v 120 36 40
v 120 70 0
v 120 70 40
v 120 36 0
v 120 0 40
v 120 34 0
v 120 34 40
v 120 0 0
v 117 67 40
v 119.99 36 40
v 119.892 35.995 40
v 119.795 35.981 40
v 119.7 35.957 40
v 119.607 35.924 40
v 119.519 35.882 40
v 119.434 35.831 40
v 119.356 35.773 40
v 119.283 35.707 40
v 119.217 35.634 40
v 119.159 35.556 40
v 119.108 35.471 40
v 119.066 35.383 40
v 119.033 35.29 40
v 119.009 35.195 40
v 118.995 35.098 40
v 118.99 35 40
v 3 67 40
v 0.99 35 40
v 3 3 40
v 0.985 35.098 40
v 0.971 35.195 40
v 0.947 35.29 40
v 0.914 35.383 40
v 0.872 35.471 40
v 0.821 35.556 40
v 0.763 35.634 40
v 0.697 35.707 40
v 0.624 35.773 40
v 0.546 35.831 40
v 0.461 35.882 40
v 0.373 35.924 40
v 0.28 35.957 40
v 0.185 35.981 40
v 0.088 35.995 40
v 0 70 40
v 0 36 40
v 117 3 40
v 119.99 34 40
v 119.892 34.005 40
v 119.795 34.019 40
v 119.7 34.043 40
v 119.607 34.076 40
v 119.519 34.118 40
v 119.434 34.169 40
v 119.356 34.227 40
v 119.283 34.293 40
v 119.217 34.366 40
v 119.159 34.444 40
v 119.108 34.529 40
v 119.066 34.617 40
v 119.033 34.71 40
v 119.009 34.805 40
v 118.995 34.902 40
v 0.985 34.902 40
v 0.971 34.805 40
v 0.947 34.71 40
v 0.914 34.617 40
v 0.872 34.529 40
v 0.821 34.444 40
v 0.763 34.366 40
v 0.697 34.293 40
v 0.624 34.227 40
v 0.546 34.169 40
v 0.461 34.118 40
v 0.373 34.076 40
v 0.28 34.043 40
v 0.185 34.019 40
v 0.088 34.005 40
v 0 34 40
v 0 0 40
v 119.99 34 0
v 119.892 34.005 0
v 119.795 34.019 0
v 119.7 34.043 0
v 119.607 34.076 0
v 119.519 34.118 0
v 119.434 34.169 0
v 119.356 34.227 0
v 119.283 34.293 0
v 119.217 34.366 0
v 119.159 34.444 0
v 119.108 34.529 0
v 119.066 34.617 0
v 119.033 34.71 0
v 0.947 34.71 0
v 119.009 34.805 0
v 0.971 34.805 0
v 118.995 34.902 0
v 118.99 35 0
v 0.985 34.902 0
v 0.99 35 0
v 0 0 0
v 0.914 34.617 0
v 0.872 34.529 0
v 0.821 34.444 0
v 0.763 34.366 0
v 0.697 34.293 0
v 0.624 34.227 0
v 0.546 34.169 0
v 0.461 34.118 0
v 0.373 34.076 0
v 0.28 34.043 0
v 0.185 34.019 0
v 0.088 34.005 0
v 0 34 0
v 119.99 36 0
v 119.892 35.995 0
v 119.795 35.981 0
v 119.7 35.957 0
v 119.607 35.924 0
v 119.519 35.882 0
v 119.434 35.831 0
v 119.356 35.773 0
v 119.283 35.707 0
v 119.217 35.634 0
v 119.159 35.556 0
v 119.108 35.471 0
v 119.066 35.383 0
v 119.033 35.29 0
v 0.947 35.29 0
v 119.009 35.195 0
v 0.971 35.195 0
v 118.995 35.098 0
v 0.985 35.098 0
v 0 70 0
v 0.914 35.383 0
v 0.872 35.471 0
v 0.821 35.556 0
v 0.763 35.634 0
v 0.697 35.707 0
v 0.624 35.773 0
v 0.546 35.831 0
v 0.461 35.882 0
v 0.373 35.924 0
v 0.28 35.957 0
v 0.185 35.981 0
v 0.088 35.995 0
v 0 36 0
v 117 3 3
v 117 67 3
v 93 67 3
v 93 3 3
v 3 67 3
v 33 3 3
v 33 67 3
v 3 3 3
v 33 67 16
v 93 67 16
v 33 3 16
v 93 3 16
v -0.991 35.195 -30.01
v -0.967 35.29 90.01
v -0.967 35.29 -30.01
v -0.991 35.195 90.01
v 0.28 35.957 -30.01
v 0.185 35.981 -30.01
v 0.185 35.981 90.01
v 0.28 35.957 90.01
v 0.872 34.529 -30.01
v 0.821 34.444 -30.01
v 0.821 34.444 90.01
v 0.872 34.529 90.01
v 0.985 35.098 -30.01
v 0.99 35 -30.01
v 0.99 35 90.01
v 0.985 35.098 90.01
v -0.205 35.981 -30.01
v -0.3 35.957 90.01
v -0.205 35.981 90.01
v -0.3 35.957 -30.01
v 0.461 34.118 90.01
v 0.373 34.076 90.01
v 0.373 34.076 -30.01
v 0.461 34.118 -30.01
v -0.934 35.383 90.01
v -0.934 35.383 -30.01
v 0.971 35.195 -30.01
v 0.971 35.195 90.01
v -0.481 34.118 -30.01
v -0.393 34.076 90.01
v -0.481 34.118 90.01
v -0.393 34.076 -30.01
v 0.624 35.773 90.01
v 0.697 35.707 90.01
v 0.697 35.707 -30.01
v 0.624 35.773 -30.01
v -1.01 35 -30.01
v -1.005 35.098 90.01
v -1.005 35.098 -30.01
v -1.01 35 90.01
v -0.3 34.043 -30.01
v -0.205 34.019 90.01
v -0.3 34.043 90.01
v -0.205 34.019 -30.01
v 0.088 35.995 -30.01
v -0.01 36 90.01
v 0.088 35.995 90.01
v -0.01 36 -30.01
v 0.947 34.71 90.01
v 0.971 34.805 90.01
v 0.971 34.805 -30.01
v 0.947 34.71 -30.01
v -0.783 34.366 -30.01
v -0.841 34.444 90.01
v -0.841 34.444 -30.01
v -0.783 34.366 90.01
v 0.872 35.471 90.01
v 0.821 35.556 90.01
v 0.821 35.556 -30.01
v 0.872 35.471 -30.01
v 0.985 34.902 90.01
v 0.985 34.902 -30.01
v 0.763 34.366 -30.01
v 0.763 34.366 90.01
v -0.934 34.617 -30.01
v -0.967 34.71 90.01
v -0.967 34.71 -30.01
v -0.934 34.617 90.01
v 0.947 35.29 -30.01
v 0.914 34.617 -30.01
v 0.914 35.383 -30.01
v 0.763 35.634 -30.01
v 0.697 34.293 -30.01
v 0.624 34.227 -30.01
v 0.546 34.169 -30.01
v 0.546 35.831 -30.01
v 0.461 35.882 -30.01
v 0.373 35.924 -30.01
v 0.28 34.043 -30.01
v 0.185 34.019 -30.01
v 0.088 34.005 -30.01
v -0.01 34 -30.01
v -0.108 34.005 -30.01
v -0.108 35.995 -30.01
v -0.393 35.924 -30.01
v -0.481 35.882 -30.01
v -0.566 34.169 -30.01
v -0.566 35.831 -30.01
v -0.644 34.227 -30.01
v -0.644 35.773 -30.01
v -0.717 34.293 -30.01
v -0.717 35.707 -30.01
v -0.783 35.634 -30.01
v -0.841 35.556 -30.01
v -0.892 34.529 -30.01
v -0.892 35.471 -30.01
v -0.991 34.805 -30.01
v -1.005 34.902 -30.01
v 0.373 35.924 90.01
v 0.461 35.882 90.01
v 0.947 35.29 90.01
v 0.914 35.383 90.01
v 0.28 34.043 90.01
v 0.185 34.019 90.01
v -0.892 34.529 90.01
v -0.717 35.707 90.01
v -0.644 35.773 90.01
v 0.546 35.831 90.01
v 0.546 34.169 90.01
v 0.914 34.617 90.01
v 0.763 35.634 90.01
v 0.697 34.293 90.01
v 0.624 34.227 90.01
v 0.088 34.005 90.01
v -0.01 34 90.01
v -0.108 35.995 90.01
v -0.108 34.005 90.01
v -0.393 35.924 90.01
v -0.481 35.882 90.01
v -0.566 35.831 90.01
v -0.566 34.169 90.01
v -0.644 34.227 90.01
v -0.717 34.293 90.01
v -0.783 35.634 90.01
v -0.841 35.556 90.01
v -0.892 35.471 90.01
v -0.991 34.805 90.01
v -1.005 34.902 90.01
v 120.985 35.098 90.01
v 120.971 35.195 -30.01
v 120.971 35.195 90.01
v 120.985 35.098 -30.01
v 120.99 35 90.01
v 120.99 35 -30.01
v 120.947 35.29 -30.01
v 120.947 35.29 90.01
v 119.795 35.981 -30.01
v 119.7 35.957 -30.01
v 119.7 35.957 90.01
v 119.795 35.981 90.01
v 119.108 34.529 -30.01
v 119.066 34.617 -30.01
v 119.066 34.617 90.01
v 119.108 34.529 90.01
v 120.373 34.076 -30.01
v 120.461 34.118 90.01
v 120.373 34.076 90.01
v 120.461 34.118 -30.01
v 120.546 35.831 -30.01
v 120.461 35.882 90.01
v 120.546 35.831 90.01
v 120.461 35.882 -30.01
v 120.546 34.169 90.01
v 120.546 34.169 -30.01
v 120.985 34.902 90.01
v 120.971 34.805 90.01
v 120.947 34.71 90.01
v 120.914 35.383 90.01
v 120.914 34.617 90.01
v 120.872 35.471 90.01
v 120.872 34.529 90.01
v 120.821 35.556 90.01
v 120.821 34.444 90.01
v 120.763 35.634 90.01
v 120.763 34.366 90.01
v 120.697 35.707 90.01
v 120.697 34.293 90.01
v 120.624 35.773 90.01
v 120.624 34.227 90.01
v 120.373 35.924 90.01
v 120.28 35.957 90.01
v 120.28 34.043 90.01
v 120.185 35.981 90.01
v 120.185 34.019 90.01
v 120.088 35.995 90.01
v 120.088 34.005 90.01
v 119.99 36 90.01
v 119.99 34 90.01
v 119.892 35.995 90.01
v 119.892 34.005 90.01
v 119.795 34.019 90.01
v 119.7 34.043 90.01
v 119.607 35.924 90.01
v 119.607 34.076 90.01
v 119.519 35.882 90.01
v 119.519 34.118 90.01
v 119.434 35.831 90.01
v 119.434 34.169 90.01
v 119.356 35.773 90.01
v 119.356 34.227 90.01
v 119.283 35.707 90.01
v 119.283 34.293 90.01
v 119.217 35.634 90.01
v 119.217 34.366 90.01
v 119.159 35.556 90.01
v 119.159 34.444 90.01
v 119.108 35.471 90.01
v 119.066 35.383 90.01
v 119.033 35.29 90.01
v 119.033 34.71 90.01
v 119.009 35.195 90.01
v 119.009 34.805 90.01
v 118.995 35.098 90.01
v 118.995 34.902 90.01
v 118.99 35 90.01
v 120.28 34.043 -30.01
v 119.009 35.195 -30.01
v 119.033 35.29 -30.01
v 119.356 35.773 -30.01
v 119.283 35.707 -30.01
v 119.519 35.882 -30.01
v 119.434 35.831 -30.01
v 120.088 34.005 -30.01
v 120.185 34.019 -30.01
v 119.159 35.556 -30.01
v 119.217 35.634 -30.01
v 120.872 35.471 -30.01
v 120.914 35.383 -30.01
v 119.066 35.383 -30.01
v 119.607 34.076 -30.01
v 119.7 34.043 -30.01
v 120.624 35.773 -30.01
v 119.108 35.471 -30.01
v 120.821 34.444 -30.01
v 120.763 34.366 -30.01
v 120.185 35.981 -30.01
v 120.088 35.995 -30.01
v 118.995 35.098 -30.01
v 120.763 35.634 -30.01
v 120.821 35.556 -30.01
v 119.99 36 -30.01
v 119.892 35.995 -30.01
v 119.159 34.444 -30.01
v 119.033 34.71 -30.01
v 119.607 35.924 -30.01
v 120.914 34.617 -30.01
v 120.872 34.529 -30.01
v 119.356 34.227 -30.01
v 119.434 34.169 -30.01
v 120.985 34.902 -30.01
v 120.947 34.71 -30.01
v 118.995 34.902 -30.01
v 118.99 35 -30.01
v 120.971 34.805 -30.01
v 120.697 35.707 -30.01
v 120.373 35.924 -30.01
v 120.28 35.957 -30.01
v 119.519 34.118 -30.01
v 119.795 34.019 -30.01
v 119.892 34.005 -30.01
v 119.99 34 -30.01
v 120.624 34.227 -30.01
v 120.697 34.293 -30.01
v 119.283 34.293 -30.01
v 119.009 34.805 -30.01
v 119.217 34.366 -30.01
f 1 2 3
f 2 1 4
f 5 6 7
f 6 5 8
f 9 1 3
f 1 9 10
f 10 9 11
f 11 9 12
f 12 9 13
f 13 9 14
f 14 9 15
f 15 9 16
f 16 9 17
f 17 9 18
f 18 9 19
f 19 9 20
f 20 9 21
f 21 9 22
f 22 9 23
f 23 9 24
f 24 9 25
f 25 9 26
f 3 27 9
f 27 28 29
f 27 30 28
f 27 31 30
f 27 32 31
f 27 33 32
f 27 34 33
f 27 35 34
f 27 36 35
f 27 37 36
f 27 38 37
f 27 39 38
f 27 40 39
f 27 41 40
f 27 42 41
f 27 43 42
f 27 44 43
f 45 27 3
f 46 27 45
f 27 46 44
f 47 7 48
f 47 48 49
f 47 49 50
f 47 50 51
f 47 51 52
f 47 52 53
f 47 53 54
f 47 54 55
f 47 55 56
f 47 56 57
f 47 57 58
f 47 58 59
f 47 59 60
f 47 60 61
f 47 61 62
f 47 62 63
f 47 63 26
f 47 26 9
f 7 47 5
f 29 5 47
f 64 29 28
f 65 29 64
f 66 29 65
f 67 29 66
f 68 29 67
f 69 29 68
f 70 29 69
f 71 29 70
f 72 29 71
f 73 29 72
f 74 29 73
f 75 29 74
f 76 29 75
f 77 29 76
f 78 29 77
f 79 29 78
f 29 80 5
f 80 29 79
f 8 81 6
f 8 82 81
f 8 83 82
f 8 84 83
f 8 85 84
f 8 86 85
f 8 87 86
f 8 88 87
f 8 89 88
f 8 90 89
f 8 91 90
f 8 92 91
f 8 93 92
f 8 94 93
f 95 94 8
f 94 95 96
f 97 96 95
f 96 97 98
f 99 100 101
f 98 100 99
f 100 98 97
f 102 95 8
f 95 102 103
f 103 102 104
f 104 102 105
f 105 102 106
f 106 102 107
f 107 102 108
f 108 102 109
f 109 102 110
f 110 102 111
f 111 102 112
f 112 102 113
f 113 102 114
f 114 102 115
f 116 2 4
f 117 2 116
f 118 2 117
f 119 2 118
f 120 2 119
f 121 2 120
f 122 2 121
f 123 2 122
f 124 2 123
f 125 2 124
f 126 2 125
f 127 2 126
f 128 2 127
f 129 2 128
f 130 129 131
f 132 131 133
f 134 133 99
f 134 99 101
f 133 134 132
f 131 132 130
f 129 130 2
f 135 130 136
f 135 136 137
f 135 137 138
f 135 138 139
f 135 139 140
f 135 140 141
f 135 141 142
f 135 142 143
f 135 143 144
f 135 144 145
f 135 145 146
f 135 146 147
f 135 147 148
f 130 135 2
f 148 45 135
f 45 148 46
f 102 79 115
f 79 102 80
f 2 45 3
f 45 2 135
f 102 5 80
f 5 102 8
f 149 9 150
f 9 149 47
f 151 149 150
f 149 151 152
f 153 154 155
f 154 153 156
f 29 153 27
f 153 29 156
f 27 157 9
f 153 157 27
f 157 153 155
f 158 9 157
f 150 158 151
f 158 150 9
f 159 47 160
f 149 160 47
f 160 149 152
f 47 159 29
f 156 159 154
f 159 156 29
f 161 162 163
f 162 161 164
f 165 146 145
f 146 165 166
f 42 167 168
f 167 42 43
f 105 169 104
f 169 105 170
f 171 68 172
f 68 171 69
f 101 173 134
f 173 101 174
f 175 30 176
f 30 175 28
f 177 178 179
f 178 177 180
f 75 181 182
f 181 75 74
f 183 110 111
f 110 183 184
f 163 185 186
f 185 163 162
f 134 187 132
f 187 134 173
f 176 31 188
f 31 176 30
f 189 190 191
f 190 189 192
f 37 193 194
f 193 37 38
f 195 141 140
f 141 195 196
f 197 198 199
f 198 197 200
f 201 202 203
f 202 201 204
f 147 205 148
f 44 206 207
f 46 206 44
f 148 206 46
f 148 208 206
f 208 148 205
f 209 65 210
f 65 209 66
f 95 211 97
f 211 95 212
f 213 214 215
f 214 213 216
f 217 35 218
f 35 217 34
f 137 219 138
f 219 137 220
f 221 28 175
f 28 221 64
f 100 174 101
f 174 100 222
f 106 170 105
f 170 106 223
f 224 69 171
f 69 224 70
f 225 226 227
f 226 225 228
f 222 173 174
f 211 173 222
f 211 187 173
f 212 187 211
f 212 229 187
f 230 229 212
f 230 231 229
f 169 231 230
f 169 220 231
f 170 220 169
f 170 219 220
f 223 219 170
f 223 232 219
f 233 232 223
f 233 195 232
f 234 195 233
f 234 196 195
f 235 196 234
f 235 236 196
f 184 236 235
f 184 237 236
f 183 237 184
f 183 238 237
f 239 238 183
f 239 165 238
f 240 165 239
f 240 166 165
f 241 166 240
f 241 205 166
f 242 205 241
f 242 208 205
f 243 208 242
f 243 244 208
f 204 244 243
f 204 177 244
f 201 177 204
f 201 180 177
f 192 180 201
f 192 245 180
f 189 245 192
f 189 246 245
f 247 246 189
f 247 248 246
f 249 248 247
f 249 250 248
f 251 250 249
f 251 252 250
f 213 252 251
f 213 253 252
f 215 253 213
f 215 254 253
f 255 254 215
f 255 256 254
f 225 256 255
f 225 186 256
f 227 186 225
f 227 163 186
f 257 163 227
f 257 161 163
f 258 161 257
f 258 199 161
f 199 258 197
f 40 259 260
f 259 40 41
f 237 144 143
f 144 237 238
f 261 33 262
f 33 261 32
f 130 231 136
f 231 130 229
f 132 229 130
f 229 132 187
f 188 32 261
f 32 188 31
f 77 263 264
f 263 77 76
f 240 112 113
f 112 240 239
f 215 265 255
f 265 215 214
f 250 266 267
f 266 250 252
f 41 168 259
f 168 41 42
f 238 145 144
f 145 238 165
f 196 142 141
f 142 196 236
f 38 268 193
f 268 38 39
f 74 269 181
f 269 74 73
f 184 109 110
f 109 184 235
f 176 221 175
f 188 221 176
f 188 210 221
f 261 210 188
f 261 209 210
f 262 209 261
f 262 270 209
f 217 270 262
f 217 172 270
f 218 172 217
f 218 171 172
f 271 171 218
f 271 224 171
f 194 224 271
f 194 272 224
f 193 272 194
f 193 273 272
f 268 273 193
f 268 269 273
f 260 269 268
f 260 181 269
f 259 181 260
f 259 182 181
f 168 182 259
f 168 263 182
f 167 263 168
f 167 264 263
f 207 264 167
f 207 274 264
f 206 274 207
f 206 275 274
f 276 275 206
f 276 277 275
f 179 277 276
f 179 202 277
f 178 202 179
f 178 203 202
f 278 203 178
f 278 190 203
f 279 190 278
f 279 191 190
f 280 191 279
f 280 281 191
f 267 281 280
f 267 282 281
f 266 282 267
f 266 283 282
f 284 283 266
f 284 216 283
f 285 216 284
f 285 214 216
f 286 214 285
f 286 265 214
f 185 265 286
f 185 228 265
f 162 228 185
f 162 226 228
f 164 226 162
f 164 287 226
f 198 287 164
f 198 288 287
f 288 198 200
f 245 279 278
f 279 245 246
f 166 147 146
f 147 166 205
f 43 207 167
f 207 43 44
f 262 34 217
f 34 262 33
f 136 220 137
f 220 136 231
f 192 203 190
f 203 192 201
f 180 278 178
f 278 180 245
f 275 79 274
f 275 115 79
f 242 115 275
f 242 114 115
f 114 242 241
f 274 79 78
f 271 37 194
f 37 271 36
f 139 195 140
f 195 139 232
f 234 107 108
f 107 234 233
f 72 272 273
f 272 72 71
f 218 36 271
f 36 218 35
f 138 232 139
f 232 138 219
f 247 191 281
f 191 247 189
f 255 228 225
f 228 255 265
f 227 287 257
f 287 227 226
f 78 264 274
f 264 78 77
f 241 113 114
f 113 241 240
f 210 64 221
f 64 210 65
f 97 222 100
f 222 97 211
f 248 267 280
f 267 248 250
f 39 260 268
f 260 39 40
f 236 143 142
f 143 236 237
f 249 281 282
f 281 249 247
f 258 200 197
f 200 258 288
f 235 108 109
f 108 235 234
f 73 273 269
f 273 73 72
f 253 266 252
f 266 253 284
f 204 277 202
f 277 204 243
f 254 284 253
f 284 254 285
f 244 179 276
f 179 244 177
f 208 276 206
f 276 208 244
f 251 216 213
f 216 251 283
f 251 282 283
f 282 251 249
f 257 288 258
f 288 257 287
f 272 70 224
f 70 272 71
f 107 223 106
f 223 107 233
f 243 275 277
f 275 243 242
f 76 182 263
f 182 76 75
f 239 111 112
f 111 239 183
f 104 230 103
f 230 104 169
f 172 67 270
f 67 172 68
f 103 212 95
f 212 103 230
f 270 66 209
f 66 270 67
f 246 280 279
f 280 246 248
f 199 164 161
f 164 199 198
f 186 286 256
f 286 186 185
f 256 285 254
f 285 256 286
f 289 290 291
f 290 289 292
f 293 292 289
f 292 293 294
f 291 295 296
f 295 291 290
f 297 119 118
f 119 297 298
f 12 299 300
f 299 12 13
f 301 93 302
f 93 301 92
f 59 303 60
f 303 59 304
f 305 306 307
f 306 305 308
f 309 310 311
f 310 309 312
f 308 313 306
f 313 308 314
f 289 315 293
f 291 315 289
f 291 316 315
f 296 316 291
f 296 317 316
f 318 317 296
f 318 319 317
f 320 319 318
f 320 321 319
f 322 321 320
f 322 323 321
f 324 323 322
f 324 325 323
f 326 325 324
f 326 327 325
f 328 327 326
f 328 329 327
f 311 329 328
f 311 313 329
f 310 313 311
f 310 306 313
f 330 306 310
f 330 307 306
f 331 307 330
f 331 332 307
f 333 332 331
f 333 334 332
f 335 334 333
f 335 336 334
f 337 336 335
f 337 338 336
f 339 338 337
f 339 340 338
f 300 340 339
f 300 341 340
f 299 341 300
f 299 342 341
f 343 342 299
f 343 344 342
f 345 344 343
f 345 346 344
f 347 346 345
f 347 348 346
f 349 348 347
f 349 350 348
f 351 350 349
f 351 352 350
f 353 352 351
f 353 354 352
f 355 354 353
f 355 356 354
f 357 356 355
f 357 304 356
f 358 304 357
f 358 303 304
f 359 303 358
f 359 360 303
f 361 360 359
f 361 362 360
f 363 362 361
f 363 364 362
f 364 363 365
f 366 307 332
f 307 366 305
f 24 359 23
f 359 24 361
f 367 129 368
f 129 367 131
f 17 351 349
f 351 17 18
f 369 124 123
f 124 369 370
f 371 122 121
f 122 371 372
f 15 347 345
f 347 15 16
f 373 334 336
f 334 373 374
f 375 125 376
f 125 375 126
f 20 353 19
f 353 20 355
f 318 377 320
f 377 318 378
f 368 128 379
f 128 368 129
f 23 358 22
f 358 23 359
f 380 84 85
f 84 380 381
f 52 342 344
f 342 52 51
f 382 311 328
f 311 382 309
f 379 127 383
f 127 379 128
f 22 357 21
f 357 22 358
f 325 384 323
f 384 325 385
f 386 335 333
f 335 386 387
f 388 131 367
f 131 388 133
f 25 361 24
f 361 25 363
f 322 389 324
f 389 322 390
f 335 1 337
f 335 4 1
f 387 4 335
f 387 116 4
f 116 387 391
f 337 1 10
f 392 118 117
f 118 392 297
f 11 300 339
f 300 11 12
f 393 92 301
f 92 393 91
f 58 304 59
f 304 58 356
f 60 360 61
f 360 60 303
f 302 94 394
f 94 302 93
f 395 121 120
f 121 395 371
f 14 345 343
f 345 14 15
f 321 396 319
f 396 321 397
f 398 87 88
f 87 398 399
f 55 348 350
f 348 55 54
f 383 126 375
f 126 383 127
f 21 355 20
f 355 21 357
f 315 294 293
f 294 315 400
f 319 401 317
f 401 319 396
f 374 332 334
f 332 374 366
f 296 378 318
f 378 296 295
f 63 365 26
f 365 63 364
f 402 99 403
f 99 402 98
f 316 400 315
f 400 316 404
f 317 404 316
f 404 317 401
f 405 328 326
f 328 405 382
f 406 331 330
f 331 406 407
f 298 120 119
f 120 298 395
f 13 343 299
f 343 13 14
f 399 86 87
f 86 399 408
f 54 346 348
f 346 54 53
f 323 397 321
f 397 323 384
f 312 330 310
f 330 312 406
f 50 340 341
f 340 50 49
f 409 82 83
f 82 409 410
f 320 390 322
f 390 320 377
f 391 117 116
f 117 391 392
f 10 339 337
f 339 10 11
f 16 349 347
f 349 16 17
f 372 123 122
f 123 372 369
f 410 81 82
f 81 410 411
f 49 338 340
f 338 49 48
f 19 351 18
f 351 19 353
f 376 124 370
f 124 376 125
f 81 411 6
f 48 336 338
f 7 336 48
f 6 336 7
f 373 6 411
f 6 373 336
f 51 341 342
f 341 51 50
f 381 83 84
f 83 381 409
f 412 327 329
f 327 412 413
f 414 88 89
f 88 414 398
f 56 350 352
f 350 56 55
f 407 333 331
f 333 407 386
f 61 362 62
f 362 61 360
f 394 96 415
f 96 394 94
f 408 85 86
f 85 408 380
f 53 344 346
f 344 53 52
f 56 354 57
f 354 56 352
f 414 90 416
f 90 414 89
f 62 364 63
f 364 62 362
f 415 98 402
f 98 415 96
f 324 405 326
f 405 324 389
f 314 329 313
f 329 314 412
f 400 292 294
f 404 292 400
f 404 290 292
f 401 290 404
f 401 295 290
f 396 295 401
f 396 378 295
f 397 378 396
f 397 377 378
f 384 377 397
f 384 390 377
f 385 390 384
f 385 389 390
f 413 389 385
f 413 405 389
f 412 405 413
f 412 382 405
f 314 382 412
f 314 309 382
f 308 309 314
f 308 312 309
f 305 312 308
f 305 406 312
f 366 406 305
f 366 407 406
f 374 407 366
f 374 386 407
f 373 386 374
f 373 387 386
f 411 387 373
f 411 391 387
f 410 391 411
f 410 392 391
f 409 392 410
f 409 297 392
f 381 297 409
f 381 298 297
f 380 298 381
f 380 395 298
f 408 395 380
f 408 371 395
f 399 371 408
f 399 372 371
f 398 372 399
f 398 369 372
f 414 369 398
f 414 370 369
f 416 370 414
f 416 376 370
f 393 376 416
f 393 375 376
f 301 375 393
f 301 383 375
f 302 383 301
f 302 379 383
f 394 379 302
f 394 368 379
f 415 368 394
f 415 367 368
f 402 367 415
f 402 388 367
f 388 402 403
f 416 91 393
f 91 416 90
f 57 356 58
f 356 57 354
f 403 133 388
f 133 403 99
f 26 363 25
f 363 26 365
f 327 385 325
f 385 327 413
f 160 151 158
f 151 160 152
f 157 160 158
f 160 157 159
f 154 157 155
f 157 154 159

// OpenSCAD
// Buffer tank for mini horizontal gel-electrophoresis box
// Outer dimensions: 120 mm (X) x 70 mm (Y) x 40 mm (Z)
// Wall thickness: 3 mm, floor thickness: 3 mm
// Platform: 60 mm long (X), full inner width (Y), top at z = 13 mm (10 mm above inner floor)

$fn = 64;

// Dimensions
outer_x = 120;
outer_y = 70;
outer_z = 40;
wall_thick = 3;
floor_thick = 3;
platform_length = 60;
platform_height = 13; // z = 13 mm from bottom
hole_dia = 2;
hole_z = 30;

// Calculate inner dimensions
inner_x = outer_x - 2 * wall_thick;
inner_y = outer_y - 2 * wall_thick;
inner_z = outer_z - floor_thick;

// Buffer tank shell
module tank_shell() {
    difference() {
        // Outer shell
        cube([outer_x, outer_y, outer_z]);
        
        // Inner cavity (removes interior)
        translate([wall_thick, wall_thick, floor_thick])
            cube([inner_x, inner_y, inner_z]);
        
        // Remove platform area from the bottom (to create hollow under platform)
        // Platform is centered in X, so it starts at (outer_x - platform_length)/2
        platform_start_x = (outer_x - platform_length) / 2;
        translate([wall_thick + platform_start_x, wall_thick, floor_thick])
            cube([platform_length, inner_y, platform_height]);
    }
}

// Platform (solid raised platform)
module platform() {
    platform_start_x = (outer_x - platform_length) / 2;
    translate([wall_thick + platform_start_x, wall_thick, floor_thick])
        cube([platform_length, inner_y, platform_height]);
}

// Electrode holes (through end walls at X = 0 and X = outer_x)
module electrode_holes() {
    // Left hole (at x = 0 wall, centered in Y and at z = 30)
    // Position: x = -0.01 (to cut through left wall), y = outer_y/2, z = hole_z
    translate([-0.01, outer_y/2, hole_z])
        cylinder(h = 0.02 + outer_x, d = hole_dia, center = true);
    
    // Right hole (at x = outer_x wall)
    translate([outer_x - 0.01, outer_y/2, hole_z])
        cylinder(h = 0.02 + outer_x, d = hole_dia, center = true);
}

// Build the buffer tank
module buffer_tank() {
    union() {
        // Tank shell
        tank_shell();
        
        // Platform
        platform();
        
        // Electrode holes (cut through end walls)
        electrode_holes();
    }
}

// Render the buffer tank
buffer_tank();
